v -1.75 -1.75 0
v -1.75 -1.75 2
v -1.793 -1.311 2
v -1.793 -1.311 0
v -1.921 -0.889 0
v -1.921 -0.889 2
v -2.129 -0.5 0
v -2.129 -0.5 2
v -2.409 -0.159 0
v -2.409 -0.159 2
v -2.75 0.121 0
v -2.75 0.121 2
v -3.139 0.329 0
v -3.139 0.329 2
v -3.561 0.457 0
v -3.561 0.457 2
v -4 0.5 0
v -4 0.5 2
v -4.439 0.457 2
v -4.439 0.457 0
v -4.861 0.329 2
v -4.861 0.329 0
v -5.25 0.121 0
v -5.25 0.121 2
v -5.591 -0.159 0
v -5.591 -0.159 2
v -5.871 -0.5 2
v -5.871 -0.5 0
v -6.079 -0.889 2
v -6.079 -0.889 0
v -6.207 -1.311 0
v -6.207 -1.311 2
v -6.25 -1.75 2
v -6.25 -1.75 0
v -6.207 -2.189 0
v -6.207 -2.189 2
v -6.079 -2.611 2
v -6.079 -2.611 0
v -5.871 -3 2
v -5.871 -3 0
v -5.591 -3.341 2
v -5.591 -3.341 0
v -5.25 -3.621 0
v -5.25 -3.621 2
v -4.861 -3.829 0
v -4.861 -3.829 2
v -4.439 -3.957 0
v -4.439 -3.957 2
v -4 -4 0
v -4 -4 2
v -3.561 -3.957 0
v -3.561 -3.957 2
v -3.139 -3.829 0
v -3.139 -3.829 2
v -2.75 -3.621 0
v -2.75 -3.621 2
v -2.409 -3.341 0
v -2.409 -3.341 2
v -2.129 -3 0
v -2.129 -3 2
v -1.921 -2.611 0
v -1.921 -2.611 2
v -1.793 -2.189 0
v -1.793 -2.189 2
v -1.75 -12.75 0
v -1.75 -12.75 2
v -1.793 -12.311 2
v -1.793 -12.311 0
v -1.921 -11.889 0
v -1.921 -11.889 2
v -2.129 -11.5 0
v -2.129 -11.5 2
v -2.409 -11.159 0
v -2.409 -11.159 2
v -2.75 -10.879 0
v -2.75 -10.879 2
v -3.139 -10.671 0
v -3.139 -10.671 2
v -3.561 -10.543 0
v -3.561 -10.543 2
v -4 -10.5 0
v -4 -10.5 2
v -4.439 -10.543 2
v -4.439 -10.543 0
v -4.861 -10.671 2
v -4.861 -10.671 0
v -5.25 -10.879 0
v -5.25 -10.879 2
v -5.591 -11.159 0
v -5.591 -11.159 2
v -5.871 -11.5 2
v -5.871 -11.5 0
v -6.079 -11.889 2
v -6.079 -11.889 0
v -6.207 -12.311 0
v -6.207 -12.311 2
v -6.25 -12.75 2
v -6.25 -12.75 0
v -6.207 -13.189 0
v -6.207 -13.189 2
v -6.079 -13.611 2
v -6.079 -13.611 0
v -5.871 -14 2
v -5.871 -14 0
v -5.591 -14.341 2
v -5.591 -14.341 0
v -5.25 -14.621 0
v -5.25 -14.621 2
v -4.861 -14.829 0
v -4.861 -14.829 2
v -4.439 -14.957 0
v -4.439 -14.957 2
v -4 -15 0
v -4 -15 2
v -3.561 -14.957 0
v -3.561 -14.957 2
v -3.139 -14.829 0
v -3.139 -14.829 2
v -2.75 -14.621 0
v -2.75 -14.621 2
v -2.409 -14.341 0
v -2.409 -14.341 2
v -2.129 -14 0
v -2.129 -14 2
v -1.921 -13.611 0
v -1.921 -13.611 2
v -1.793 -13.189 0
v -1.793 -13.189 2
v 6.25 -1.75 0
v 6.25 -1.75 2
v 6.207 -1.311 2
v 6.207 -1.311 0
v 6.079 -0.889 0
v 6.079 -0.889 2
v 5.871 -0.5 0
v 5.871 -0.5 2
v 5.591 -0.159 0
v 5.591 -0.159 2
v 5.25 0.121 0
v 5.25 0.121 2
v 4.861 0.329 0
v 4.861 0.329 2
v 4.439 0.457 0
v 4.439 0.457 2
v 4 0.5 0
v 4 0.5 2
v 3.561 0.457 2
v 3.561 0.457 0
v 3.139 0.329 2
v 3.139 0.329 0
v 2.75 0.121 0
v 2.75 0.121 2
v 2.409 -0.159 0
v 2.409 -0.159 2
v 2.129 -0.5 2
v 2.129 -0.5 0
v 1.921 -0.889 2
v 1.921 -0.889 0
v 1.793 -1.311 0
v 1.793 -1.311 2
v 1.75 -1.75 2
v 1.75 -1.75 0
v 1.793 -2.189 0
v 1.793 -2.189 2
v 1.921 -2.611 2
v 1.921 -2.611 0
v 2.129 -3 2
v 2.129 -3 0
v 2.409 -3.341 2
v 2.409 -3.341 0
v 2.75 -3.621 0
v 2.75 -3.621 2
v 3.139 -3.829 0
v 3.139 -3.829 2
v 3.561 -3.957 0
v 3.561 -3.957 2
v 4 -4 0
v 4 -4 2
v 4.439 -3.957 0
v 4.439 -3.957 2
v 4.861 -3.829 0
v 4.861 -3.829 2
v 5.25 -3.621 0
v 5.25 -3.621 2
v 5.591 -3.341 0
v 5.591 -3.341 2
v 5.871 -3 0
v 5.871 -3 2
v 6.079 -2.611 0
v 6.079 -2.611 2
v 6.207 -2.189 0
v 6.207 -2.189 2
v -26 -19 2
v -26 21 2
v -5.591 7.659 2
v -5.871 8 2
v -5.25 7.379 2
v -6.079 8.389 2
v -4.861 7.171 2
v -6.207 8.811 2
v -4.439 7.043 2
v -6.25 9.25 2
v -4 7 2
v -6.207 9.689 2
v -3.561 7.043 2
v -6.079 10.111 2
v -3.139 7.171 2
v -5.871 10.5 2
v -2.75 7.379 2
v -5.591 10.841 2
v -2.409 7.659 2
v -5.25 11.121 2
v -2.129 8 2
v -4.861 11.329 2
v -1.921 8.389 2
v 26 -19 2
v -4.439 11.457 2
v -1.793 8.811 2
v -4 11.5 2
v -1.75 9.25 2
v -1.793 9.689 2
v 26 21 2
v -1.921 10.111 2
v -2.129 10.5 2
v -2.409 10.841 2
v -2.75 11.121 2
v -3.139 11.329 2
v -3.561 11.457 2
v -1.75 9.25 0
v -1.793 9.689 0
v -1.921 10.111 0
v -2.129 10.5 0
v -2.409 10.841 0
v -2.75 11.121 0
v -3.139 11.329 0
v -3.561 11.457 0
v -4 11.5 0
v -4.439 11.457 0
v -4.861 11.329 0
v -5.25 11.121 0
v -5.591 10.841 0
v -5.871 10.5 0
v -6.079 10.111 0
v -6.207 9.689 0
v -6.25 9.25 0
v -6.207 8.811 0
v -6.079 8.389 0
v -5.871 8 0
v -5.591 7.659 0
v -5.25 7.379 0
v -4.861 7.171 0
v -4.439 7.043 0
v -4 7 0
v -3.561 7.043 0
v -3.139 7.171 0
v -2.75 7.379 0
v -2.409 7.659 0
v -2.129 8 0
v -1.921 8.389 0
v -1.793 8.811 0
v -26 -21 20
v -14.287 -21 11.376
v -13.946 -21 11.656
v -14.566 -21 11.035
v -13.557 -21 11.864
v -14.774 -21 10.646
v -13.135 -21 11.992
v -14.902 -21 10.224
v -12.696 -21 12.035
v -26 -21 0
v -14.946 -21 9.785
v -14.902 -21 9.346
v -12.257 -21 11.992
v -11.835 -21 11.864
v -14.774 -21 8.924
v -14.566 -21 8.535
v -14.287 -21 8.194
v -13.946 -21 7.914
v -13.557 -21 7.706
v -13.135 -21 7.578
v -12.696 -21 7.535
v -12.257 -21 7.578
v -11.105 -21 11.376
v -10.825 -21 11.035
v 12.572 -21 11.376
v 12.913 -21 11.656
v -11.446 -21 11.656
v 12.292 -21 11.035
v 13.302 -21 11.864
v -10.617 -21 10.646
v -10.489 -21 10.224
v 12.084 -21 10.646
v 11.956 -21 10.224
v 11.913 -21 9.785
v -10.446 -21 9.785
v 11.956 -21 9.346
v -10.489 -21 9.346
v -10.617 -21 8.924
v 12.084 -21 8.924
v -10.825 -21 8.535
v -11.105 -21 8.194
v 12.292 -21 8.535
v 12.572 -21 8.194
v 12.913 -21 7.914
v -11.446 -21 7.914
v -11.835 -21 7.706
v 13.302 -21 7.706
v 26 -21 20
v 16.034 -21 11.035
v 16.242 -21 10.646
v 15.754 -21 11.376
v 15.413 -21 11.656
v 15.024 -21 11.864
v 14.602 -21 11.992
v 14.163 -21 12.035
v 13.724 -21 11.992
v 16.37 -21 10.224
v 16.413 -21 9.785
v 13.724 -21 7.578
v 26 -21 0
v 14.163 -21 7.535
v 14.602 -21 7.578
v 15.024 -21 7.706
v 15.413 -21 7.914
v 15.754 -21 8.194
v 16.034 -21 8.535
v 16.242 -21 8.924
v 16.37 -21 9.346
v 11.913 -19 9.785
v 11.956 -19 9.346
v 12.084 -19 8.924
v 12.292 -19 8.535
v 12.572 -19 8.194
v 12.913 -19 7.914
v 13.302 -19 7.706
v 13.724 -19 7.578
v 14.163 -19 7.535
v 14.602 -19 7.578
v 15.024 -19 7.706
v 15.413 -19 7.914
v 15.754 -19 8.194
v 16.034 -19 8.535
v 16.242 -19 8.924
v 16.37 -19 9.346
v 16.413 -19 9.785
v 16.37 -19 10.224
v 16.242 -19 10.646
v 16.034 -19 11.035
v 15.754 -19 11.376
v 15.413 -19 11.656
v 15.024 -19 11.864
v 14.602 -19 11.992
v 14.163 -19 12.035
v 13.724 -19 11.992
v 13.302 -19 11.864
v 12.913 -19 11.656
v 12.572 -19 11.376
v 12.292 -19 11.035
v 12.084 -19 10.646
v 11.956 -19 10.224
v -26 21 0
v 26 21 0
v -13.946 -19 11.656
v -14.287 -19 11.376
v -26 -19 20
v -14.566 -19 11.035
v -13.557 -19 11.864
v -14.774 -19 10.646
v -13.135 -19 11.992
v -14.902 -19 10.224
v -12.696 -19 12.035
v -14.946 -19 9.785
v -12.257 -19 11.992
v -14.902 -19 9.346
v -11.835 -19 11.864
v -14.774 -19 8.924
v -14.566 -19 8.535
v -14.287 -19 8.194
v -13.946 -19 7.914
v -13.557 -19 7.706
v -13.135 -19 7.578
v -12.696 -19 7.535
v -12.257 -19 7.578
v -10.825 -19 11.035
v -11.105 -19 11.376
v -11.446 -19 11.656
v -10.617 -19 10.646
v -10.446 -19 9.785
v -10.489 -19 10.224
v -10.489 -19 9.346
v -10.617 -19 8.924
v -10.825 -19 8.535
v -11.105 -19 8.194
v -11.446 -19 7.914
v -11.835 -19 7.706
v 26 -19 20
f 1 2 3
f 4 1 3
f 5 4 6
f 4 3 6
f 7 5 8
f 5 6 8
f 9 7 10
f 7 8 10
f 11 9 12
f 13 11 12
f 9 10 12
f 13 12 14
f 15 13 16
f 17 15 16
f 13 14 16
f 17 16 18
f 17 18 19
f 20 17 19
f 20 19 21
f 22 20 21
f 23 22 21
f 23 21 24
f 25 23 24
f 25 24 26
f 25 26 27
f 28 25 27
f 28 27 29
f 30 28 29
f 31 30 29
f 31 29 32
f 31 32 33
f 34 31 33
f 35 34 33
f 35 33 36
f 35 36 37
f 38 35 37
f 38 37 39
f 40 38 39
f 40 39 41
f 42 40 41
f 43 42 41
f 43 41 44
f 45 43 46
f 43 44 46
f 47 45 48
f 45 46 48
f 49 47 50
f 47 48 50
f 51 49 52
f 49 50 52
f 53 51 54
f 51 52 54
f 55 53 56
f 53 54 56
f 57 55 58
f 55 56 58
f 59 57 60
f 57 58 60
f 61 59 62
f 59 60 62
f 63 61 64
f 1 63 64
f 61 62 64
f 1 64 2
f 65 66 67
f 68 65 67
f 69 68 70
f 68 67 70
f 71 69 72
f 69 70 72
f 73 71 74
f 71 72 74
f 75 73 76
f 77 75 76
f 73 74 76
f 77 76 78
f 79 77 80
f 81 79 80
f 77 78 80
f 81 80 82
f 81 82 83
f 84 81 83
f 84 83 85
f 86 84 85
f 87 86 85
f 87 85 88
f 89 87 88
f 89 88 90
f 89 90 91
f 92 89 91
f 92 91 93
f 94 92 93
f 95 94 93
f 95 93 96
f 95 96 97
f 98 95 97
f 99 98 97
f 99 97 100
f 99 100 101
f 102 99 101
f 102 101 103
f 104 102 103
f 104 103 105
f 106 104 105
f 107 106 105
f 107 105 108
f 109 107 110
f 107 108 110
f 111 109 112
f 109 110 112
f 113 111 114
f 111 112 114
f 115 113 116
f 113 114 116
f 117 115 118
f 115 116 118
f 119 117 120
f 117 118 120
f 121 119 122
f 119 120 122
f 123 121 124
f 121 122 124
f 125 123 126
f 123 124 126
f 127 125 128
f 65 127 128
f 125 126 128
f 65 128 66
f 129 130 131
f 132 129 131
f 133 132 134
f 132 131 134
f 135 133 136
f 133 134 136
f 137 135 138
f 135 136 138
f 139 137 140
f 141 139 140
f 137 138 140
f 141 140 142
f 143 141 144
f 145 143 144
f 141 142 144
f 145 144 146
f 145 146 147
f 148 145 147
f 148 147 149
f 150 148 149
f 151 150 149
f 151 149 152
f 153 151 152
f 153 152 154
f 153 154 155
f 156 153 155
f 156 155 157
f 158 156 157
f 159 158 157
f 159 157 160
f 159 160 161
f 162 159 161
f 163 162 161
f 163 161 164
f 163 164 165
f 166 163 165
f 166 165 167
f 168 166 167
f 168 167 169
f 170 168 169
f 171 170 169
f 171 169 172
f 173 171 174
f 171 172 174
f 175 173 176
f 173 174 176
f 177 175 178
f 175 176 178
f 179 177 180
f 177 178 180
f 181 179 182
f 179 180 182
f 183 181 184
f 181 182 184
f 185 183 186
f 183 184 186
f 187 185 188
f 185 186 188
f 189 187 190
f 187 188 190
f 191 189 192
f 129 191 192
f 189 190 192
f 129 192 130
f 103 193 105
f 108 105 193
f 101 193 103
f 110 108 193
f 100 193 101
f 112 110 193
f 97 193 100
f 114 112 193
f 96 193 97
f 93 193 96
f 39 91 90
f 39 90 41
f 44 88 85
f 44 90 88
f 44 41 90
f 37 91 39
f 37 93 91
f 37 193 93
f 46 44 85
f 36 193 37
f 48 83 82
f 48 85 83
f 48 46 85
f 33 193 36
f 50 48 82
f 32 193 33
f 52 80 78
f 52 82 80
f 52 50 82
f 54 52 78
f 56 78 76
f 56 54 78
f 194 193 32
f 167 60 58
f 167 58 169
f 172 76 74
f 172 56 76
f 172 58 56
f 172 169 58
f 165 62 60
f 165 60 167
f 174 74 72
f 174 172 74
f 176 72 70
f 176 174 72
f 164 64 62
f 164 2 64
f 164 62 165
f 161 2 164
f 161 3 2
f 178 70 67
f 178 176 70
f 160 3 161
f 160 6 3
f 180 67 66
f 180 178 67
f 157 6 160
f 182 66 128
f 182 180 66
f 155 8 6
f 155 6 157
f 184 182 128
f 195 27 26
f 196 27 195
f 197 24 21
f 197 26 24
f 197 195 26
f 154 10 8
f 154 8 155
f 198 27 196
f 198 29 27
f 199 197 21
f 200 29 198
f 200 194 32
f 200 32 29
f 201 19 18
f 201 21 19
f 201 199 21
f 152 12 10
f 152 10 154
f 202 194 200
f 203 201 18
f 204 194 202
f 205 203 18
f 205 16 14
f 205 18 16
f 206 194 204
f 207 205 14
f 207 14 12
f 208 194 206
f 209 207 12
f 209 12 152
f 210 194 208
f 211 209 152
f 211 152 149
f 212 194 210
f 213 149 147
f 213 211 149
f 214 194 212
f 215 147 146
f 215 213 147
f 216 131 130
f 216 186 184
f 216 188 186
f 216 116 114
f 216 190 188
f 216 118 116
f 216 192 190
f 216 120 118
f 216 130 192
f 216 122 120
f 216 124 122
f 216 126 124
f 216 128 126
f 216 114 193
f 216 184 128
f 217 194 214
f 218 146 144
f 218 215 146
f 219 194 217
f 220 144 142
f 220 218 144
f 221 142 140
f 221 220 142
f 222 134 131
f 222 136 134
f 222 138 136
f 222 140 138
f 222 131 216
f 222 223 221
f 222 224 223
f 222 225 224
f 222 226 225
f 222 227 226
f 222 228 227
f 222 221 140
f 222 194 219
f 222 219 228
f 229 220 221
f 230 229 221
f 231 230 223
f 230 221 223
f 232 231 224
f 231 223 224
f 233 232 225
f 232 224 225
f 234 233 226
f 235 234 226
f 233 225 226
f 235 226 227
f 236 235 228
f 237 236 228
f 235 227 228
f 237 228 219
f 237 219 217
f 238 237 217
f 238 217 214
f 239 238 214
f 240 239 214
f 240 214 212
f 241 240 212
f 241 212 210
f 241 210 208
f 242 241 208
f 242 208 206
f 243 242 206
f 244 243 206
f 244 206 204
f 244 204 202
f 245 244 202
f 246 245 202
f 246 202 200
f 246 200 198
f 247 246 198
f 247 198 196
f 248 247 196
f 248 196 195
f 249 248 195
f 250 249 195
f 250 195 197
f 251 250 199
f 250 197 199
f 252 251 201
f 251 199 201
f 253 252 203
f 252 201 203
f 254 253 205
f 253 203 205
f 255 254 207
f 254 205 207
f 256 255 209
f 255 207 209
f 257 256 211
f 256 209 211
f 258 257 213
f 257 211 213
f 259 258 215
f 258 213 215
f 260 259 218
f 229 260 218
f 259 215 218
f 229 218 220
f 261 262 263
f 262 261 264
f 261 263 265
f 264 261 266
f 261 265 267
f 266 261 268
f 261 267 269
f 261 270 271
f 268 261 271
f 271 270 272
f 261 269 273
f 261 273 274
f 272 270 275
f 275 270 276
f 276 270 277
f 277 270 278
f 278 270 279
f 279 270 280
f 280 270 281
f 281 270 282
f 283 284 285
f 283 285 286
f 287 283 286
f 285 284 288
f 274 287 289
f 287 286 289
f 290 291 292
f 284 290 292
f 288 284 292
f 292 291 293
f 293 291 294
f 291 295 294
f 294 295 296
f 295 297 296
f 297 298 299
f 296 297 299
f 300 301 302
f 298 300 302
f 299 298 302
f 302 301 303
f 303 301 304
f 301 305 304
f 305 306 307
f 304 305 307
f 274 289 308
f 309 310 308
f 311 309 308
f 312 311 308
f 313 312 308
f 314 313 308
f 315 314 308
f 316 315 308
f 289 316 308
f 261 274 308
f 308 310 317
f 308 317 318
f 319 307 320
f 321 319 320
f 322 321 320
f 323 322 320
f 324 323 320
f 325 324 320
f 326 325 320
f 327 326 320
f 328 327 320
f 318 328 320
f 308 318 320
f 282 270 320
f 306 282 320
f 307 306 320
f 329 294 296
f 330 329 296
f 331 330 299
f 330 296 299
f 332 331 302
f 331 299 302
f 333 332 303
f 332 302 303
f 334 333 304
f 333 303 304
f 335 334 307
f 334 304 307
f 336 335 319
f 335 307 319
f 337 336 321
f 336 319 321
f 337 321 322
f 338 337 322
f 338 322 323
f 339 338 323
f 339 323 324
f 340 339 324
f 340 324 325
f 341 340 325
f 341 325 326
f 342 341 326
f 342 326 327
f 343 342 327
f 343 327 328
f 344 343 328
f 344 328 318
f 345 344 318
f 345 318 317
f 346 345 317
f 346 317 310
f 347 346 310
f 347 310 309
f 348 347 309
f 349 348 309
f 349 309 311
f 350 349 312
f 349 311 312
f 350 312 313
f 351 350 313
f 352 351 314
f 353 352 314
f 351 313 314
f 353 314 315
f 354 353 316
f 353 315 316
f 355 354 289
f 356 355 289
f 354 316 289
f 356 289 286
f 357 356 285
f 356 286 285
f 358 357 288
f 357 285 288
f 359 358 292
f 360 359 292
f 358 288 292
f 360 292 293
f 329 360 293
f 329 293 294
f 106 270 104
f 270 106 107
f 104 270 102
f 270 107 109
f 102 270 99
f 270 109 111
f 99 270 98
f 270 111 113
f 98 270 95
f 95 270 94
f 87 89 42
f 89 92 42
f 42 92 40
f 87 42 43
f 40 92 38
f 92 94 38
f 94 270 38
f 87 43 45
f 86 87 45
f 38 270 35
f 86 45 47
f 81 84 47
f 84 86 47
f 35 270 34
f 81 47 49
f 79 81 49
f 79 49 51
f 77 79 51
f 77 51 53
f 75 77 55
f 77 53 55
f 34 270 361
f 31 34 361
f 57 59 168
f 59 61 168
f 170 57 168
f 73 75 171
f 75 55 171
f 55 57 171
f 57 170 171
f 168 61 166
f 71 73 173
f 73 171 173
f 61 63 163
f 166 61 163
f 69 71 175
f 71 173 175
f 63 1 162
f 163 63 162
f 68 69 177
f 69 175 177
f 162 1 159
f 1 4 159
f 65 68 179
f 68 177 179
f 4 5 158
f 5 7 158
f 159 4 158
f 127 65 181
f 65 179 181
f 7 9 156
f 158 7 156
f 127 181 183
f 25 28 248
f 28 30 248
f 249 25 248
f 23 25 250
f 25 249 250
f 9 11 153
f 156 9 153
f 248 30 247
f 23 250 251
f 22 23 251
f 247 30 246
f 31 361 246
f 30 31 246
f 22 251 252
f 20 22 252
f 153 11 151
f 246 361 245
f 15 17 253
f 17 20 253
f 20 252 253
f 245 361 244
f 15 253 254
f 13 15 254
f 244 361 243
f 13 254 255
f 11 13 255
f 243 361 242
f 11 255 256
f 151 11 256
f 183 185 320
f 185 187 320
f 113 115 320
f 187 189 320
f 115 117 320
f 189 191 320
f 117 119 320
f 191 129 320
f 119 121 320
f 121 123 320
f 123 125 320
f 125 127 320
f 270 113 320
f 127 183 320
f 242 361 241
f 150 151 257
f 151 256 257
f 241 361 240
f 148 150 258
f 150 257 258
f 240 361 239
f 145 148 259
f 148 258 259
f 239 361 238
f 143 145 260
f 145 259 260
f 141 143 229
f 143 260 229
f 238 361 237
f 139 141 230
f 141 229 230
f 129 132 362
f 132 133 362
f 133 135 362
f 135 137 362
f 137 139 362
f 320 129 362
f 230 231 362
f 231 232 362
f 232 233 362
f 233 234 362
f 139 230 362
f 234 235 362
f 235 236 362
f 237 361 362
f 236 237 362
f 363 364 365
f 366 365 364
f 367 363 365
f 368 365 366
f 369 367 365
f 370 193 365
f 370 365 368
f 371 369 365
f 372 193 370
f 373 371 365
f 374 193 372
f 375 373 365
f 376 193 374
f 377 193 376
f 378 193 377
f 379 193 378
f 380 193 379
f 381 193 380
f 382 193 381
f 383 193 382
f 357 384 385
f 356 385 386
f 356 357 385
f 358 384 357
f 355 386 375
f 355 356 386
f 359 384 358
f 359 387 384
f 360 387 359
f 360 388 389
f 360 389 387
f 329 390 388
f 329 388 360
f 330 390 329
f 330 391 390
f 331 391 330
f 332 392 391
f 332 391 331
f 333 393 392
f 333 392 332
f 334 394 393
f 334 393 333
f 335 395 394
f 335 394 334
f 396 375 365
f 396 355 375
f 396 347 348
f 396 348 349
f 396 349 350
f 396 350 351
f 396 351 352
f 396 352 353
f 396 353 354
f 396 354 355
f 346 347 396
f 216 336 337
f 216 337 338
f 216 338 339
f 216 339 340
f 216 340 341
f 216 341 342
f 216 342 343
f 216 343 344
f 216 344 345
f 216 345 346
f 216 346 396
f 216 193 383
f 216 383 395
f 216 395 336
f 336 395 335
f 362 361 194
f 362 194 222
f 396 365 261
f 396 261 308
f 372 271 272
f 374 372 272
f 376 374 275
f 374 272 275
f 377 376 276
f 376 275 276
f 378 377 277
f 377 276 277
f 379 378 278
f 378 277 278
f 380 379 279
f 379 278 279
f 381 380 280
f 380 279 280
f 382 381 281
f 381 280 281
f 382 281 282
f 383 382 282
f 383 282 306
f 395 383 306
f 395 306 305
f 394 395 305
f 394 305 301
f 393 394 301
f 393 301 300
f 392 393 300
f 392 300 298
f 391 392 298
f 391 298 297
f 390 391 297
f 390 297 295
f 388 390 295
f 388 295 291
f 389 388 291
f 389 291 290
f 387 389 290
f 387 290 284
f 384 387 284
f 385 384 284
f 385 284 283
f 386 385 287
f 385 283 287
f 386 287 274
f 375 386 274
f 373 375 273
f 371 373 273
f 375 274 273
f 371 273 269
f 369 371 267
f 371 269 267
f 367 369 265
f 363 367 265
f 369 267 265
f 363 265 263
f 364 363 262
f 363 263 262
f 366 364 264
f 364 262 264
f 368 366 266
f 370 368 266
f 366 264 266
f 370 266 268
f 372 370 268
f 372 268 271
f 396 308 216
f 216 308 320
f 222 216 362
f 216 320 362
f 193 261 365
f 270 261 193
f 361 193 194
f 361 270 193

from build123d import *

# Parameters (mm, degrees)
ESQUISSE1_W             = 52
ESQUISSE1_H             = 42
BOSS_EXTRU_1_DEPTH      = 20
ESQUISSE2_W             = 66.008627658
ESQUISSE2_H             = 40.946179855
ENL_V_MAT_EXTRU_1_DEPTH = 40
D_GAGEMENT_M41_D        = 4.5
D_GAGEMENT_M42_D        = 4.5


with BuildPart() as part:
    # Esquisse1 → Boss.-Extru.1 (new body)
    with BuildSketch(Plane.XY):
        Rectangle(ESQUISSE1_W, ESQUISSE1_H)
    extrude(amount=BOSS_EXTRU_1_DEPTH)

    # Esquisse2 → Enlèv. mat.-Extru.1 (cut)
    with BuildSketch(Plane(origin=(0, 21, 0), x_dir=(1, 0, 0), z_dir=(0, 1, 0))):
        with Locations((1.405901571, -22.473089928)):
            Rectangle(ESQUISSE2_W, ESQUISSE2_H)
    extrude(amount=-ENL_V_MAT_EXTRU_1_DEPTH, mode=Mode.SUBTRACT)

    # Dégagement M41 (through all)
    with Locations(Plane(origin=(0, 0, 0), x_dir=(-1, 0, 0), z_dir=(0, 0, -1))):
        with Locations((4, -12.75), (4, -1.75), (4, 9.25), (-4, -1.75)):
            Hole(D_GAGEMENT_M41_D / 2)

    # Dégagement M42 (through all)
    with Locations(Plane(origin=(0, -19, 0), x_dir=(1, 0, 0), z_dir=(0, 1, 0))):
        with Locations((-12.695679618, -9.785063319), (14.163037838, -9.785063319)):
            Hole(D_GAGEMENT_M42_D / 2)


solid = part.part
